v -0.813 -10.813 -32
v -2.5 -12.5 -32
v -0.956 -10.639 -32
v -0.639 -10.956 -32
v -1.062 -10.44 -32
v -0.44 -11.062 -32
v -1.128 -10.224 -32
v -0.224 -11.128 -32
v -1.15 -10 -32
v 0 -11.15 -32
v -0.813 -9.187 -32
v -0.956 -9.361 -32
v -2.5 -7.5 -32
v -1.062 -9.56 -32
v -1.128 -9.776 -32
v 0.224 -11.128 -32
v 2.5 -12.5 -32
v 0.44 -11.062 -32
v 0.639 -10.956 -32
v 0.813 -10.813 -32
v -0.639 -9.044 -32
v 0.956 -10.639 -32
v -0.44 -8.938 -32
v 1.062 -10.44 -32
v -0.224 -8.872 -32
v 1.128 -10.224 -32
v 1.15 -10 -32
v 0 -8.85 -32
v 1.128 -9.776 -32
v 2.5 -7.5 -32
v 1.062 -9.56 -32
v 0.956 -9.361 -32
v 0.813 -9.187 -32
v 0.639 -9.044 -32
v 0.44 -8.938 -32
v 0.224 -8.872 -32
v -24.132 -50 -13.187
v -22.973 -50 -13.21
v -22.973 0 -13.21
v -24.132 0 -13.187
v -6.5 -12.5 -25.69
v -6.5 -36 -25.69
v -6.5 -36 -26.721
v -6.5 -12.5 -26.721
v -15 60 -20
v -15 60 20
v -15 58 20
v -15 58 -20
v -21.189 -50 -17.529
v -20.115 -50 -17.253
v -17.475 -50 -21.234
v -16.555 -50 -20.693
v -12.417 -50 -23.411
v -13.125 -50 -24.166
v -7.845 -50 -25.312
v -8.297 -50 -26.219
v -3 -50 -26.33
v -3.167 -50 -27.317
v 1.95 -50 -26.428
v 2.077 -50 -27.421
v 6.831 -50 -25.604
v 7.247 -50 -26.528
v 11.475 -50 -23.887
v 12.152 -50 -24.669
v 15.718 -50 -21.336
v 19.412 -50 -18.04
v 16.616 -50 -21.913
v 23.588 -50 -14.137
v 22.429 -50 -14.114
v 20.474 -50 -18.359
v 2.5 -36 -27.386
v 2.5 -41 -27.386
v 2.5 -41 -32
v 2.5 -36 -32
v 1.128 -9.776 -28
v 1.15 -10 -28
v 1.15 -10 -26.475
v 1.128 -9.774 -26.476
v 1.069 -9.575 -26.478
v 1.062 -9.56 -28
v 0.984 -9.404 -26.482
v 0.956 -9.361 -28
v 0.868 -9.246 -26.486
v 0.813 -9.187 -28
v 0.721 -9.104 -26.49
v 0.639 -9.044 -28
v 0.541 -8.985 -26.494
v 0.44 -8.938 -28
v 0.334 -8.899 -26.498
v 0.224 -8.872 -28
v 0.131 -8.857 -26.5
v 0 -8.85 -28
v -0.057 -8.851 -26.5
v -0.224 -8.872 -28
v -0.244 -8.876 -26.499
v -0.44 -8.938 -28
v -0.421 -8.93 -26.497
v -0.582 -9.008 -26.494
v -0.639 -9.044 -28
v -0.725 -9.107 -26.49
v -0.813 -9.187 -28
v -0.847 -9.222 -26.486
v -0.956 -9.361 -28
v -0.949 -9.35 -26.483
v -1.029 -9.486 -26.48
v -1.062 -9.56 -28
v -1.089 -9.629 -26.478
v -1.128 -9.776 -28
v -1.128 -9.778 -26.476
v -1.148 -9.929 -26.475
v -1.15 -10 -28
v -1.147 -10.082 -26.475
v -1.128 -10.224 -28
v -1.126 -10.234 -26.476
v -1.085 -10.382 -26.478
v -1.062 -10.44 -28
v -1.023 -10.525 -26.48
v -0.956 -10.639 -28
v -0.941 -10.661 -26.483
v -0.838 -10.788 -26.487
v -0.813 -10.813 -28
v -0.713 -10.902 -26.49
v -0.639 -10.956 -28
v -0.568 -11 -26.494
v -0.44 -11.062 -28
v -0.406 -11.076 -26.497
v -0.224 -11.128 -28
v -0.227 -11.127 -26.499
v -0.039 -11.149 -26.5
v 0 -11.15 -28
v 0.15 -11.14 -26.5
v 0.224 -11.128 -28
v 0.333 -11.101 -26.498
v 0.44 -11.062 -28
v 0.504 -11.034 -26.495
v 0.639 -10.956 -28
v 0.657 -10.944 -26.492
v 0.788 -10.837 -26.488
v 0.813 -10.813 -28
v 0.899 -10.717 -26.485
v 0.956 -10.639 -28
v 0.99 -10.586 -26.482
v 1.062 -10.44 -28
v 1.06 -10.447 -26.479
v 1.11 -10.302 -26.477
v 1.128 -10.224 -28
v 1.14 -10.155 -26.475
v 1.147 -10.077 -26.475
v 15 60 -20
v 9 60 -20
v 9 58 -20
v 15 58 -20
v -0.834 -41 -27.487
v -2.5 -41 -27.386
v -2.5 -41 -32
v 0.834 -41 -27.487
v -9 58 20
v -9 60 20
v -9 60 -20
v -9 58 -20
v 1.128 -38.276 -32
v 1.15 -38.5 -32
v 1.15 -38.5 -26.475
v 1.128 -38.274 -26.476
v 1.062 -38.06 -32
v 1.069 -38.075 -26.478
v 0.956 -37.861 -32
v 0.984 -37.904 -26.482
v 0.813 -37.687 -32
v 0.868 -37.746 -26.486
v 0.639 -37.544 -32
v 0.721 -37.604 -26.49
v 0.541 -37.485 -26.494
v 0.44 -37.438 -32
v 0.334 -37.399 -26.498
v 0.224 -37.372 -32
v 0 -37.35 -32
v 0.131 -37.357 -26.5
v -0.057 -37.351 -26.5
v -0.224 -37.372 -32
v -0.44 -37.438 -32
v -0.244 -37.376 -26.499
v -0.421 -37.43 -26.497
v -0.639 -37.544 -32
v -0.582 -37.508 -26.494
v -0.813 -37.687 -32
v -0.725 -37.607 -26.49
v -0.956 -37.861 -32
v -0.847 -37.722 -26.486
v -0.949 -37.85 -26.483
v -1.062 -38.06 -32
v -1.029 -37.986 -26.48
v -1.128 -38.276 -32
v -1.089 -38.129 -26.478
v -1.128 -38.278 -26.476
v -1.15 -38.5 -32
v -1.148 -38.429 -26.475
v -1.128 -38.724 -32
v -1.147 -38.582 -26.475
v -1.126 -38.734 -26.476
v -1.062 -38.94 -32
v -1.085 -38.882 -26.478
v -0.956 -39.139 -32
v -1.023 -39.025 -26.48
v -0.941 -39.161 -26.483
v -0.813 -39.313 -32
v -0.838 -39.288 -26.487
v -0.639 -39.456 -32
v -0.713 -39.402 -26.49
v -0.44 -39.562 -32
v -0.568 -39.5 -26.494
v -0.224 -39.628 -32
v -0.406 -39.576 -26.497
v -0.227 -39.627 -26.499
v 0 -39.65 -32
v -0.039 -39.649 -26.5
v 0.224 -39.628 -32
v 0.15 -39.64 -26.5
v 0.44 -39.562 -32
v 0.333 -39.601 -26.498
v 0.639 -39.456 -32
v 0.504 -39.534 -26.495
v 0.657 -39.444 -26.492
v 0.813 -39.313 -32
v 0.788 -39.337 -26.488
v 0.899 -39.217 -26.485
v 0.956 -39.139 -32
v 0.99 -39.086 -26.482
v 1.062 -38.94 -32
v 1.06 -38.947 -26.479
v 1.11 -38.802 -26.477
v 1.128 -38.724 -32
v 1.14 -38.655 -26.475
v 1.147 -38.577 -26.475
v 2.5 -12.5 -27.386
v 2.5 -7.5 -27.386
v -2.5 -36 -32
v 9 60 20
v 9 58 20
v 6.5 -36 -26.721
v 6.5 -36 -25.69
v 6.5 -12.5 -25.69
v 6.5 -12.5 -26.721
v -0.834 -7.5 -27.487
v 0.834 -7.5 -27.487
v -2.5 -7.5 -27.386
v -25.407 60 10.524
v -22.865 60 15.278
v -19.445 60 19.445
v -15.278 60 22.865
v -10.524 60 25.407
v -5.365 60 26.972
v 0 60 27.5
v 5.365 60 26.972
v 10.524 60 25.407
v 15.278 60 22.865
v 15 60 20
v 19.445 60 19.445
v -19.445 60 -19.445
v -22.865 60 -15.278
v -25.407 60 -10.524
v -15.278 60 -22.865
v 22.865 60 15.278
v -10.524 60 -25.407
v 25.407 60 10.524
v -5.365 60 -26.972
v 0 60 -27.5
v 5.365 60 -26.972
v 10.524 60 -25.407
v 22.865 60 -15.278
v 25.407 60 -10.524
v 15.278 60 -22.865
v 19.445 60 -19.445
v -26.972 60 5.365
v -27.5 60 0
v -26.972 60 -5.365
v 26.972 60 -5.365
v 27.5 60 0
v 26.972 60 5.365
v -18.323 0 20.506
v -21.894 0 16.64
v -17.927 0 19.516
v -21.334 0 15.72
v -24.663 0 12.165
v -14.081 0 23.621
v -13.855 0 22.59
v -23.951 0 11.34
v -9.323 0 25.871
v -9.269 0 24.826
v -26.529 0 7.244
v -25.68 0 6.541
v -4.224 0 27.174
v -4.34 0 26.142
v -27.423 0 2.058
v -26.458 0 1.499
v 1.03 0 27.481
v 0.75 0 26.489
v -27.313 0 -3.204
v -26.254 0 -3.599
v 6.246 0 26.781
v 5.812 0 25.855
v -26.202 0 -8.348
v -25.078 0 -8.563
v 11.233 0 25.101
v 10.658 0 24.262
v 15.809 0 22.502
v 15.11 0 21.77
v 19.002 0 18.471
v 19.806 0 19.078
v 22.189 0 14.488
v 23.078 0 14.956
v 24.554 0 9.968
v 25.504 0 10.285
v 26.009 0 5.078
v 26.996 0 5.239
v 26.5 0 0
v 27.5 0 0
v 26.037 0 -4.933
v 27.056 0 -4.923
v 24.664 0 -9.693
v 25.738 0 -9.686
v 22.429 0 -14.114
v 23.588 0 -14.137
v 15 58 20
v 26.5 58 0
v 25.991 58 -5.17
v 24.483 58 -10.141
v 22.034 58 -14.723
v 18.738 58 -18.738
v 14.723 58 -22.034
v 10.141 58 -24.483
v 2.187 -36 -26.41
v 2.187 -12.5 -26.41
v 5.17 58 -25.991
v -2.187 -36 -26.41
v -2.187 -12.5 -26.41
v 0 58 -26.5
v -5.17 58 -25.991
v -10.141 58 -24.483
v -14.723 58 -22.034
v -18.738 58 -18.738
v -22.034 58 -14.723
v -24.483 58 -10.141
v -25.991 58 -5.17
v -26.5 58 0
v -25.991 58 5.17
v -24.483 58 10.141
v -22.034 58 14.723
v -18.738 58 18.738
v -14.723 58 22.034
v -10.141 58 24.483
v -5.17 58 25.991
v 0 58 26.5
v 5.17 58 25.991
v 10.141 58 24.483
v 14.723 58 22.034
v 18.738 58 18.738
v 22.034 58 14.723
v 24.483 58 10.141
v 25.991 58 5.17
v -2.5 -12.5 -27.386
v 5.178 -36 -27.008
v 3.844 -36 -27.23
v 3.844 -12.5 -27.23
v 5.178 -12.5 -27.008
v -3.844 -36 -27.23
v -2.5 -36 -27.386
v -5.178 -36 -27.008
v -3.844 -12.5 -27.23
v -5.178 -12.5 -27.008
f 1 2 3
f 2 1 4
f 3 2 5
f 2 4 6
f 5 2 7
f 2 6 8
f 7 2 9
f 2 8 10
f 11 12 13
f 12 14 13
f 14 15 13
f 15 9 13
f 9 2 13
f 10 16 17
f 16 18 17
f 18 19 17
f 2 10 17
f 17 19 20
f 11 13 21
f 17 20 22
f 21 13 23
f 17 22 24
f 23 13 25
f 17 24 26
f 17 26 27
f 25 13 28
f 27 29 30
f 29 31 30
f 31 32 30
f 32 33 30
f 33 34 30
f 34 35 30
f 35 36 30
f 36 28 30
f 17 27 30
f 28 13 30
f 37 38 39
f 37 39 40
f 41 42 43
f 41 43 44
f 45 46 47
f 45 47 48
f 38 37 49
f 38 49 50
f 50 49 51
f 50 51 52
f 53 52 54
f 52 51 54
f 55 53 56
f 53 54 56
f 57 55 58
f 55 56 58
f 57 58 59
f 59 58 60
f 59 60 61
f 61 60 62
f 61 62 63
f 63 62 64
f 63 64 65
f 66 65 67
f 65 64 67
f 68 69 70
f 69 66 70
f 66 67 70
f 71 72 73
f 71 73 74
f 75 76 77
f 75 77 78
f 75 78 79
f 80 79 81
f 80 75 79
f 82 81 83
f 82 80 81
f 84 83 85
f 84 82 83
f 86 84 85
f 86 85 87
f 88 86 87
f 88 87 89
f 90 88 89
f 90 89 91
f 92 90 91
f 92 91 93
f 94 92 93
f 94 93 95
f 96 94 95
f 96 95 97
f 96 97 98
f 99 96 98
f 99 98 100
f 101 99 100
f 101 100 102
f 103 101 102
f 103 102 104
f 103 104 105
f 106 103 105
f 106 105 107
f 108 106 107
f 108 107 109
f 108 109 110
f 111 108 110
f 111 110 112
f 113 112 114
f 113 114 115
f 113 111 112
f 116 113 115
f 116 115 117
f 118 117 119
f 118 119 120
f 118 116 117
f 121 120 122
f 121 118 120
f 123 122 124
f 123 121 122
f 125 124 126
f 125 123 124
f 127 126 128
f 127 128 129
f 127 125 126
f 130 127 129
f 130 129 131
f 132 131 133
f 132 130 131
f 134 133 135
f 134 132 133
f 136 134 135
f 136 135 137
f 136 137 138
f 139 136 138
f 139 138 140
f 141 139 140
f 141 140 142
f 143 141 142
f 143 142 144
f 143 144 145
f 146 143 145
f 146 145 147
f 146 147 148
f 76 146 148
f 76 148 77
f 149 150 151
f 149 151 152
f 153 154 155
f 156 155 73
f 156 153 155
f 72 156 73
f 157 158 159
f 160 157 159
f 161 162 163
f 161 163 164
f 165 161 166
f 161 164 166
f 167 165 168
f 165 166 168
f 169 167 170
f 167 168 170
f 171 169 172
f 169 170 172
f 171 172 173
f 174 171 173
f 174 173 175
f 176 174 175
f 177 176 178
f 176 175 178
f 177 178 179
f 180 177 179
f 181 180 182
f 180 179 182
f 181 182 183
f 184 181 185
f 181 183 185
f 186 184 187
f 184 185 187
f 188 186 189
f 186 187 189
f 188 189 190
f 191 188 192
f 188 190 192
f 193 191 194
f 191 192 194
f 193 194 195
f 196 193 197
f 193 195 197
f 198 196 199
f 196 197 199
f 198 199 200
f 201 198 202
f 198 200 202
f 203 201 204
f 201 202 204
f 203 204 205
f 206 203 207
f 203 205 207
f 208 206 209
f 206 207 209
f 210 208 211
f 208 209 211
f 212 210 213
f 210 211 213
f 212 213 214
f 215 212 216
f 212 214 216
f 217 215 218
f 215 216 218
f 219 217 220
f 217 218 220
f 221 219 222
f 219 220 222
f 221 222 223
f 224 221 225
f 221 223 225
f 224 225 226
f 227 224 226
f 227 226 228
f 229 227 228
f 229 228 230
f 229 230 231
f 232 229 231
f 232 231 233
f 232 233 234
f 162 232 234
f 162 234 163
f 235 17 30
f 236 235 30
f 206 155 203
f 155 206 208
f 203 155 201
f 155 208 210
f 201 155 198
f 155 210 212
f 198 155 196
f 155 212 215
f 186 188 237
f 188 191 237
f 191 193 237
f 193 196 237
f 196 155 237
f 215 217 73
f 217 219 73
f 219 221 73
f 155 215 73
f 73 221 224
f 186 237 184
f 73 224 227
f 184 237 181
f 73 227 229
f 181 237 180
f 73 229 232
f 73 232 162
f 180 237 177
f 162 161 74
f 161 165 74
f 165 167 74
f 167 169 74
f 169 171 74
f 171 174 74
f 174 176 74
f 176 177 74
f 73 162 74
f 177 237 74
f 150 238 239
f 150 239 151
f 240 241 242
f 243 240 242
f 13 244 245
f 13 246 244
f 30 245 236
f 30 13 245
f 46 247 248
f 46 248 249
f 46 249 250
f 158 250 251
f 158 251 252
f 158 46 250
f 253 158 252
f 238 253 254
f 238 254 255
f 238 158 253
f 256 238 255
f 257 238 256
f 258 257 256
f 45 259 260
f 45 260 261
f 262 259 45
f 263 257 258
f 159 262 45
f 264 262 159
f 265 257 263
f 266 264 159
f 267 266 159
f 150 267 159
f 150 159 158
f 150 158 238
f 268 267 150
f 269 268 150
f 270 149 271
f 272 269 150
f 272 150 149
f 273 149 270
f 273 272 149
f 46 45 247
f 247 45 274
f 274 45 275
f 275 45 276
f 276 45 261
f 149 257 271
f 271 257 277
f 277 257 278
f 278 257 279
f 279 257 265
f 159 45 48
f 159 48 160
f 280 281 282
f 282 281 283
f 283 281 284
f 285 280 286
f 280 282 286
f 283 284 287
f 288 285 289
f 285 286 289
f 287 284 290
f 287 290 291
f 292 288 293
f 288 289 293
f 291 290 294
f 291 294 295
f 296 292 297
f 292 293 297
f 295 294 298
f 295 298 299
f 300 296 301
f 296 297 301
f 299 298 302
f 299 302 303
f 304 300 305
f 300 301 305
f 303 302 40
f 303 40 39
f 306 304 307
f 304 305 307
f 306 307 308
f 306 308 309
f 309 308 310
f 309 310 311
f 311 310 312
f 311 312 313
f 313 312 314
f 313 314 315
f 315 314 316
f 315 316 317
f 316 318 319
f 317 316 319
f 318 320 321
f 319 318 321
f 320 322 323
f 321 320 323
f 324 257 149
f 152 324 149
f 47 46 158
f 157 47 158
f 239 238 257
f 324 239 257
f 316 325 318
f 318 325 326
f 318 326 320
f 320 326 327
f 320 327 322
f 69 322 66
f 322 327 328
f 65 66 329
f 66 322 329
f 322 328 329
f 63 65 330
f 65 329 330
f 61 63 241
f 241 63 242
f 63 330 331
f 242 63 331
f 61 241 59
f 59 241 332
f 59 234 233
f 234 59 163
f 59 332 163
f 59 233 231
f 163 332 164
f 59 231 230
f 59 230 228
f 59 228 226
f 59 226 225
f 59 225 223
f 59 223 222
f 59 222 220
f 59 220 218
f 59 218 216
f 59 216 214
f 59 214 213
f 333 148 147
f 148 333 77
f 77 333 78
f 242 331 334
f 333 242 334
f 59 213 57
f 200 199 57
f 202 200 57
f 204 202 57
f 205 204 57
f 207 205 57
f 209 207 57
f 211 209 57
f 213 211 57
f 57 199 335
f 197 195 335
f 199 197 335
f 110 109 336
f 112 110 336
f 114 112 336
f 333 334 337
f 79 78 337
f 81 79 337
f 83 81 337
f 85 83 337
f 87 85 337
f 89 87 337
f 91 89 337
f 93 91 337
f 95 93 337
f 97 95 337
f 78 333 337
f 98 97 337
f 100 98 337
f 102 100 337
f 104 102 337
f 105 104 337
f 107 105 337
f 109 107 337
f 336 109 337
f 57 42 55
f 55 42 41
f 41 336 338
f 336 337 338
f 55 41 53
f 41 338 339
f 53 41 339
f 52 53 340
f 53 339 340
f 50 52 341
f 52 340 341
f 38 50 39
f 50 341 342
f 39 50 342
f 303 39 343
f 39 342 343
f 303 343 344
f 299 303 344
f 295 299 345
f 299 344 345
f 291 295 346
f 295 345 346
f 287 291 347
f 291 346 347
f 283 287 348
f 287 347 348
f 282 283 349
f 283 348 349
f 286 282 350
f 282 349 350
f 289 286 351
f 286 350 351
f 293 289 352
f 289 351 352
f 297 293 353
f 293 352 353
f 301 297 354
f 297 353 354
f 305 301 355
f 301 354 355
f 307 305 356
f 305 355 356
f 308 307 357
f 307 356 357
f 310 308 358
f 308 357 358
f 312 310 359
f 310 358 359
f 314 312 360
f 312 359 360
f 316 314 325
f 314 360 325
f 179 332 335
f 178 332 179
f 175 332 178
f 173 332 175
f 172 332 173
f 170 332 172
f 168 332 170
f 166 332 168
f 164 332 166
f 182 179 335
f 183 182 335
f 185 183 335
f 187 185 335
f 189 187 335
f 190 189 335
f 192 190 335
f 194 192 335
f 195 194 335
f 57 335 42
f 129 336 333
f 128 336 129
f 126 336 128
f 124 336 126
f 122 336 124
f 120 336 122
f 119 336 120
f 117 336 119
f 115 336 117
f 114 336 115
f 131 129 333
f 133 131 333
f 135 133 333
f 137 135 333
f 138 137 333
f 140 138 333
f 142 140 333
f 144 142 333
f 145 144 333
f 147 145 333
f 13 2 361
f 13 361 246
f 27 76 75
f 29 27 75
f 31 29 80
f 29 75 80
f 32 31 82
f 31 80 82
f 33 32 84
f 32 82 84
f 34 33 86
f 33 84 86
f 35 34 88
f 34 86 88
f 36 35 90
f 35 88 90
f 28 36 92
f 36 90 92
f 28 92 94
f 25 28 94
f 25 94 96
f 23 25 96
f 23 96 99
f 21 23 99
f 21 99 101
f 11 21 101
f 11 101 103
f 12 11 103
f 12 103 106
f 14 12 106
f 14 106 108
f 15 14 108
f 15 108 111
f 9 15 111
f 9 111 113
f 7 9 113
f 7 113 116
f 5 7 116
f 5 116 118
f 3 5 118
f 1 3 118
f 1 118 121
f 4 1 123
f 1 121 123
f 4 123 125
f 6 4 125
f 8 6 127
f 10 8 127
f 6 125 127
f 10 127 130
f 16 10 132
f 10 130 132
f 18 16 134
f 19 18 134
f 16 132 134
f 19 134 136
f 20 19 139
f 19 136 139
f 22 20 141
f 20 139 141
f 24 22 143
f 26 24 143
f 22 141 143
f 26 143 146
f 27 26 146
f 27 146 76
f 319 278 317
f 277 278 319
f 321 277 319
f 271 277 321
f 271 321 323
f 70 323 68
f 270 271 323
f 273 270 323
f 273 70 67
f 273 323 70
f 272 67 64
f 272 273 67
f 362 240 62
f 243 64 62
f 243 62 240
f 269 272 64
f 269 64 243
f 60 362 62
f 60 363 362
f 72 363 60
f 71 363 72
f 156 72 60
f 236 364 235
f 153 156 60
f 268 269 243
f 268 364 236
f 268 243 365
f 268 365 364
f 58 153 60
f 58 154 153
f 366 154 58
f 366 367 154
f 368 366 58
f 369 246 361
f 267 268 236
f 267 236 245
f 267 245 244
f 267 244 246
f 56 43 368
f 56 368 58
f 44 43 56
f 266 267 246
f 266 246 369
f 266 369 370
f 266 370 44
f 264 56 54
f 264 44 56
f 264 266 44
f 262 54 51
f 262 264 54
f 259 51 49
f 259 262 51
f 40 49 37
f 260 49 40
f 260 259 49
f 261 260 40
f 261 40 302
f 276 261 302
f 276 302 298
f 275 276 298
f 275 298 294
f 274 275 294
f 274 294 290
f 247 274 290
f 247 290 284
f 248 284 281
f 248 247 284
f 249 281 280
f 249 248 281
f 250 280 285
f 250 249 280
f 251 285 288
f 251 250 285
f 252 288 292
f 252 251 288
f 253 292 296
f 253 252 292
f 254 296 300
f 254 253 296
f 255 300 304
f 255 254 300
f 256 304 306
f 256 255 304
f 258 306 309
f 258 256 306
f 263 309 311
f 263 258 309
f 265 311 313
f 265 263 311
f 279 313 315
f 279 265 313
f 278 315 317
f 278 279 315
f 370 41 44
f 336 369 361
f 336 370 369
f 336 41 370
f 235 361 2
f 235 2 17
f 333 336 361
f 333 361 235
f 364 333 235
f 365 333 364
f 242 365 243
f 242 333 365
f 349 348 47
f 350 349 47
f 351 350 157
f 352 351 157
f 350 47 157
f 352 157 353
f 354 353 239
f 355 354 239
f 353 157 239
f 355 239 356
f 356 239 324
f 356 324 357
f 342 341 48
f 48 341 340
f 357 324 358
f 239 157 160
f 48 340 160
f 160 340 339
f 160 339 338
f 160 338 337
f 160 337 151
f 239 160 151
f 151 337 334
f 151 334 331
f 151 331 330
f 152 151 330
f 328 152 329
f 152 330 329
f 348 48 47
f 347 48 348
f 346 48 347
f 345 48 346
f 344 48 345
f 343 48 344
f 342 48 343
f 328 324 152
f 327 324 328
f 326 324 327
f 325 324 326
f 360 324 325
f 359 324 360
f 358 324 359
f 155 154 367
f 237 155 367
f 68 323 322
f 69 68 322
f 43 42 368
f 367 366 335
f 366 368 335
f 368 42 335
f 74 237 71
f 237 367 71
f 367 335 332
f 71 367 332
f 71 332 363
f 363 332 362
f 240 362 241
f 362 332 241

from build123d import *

# Parameters (mm, degrees)
EXTRUDE_1_DEPTH           = 60
EXTRUDE_1_DEPTH_BACK      = 50
SKETCH_1_R                = 27.5
SKETCH_10_W               = 6
SKETCH_10_H               = 40
CUT_EXTRUDE_8_DEPTH       = 8.1
CUT_EXTRUDE_9_DEPTH       = 10
CUT_EXTRUDE_9_DEPTH_BACK  = 10
SKETCH_10_2_W             = 6
SKETCH_10_2_H             = 40
CUT_EXTRUDE_10_DEPTH      = 54
CUT_EXTRUDE_11_DEPTH      = 58
CUT_EXTRUDE_11_DEPTH_BACK = 54
SKETCH_12_R               = 26.5
SKETCH_13_W               = 13
SKETCH_13_H               = 23.5
CUT_EXTRUDE_12_DEPTH      = 54
EXTRUDE_2_DEPTH           = 1
EXTRUDE_2_DEPTH_BACK      = 4
SKETCH_14_W               = 5
SKETCH_14_H               = 5
CUT_EXTRUDE_13_DEPTH      = 4
CUT_EXTRUDE_13_DEPTH_BACK = 5
SKETCH_15_R               = 1.15


with BuildPart() as part:
    # 草圖1 → 填料-伸長1 (new, two sides: drawn at the far end of the back side and taken through both)
    with BuildSketch(Plane(origin=(0, 0, 0), x_dir=(1, 0, 0), z_dir=(0, 1, 0)).offset(-EXTRUDE_1_DEPTH_BACK)):
        Circle(SKETCH_1_R)
    extrude(amount=EXTRUDE_1_DEPTH + EXTRUDE_1_DEPTH_BACK)

    # 草圖10 → 除料-伸長8 (cut)
    with BuildSketch(Plane(origin=(0, 60, 0), x_dir=(1, 0, 0), z_dir=(0, 1, 0))):
        with Locations((-12, 0)):
            Rectangle(SKETCH_10_W, SKETCH_10_H)
        with Locations((12, 0)):
            Rectangle(SKETCH_10_W, SKETCH_10_H)
    extrude(amount=-CUT_EXTRUDE_8_DEPTH, mode=Mode.SUBTRACT)

    # 草圖10<2> → 除料-伸長9 (cut, two sides: drawn at the far end of the back side and taken through both)
    with BuildSketch(Plane(origin=(0, 60, 0), x_dir=(1, 0, 0), z_dir=(0, 1, 0)).offset(-CUT_EXTRUDE_9_DEPTH_BACK)):
        with Locations((-12, 0)):
            Rectangle(SKETCH_10_2_W, SKETCH_10_2_H)
        with Locations((12, 0)):
            Rectangle(SKETCH_10_2_W, SKETCH_10_2_H)
    extrude(amount=CUT_EXTRUDE_9_DEPTH + CUT_EXTRUDE_9_DEPTH_BACK, mode=Mode.SUBTRACT)

    # 草圖11 → 除料-伸長10 (cut)
    with BuildSketch(Plane(origin=(0, 0, 0), x_dir=(1, 0, 0), z_dir=(0, 1, 0))):
        with BuildLine():
            Line((23.587956714, 14.137124816), (-24.13203639, 13.186918505))
            ThreePointArc((-24.13203639, 13.186918505), (0.547474823, -27.494549848), (23.587956714, 14.137124816))
        make_face()
    extrude(amount=-CUT_EXTRUDE_10_DEPTH, mode=Mode.SUBTRACT)

    # 草圖12 → 除料-伸長11 (cut, two sides: drawn at the far end of the back side and taken through both)
    with BuildSketch(Plane(origin=(0, 0, 0), x_dir=(1, 0, 0), z_dir=(0, 1, 0)).offset(-CUT_EXTRUDE_11_DEPTH_BACK)):
        Circle(SKETCH_12_R)
    extrude(amount=CUT_EXTRUDE_11_DEPTH + CUT_EXTRUDE_11_DEPTH_BACK, mode=Mode.SUBTRACT)

    # 草圖13 → 除料-伸長12 (cut)
    with BuildSketch(Plane.XY):
        with Locations((0, -24.25)):
            Rectangle(SKETCH_13_W, SKETCH_13_H)
    extrude(amount=-CUT_EXTRUDE_12_DEPTH, mode=Mode.SUBTRACT)

    # 草圖14 → 填料-伸長2 (add, two sides: drawn at the far end of the back side and taken through both)
    with BuildSketch(Plane.XY.offset(-28).offset(-EXTRUDE_2_DEPTH_BACK)):
        with Locations((0, -38.5)):
            Rectangle(SKETCH_14_W, SKETCH_14_H)
        with Locations((0, -10)):
            Rectangle(SKETCH_14_W, SKETCH_14_H)
    extrude(amount=EXTRUDE_2_DEPTH + EXTRUDE_2_DEPTH_BACK)

    # 草圖15 → 除料-伸長13 (cut, two sides: drawn at the far end of the back side and taken through both)
    with BuildSketch(Plane.XY.offset(-28).offset(-CUT_EXTRUDE_13_DEPTH_BACK)):
        with Locations((0, -10)):
            Circle(SKETCH_15_R)
        with Locations((0, -38.5)):
            Circle(SKETCH_15_R)
    extrude(amount=CUT_EXTRUDE_13_DEPTH + CUT_EXTRUDE_13_DEPTH_BACK, mode=Mode.SUBTRACT)


solid = part.part
